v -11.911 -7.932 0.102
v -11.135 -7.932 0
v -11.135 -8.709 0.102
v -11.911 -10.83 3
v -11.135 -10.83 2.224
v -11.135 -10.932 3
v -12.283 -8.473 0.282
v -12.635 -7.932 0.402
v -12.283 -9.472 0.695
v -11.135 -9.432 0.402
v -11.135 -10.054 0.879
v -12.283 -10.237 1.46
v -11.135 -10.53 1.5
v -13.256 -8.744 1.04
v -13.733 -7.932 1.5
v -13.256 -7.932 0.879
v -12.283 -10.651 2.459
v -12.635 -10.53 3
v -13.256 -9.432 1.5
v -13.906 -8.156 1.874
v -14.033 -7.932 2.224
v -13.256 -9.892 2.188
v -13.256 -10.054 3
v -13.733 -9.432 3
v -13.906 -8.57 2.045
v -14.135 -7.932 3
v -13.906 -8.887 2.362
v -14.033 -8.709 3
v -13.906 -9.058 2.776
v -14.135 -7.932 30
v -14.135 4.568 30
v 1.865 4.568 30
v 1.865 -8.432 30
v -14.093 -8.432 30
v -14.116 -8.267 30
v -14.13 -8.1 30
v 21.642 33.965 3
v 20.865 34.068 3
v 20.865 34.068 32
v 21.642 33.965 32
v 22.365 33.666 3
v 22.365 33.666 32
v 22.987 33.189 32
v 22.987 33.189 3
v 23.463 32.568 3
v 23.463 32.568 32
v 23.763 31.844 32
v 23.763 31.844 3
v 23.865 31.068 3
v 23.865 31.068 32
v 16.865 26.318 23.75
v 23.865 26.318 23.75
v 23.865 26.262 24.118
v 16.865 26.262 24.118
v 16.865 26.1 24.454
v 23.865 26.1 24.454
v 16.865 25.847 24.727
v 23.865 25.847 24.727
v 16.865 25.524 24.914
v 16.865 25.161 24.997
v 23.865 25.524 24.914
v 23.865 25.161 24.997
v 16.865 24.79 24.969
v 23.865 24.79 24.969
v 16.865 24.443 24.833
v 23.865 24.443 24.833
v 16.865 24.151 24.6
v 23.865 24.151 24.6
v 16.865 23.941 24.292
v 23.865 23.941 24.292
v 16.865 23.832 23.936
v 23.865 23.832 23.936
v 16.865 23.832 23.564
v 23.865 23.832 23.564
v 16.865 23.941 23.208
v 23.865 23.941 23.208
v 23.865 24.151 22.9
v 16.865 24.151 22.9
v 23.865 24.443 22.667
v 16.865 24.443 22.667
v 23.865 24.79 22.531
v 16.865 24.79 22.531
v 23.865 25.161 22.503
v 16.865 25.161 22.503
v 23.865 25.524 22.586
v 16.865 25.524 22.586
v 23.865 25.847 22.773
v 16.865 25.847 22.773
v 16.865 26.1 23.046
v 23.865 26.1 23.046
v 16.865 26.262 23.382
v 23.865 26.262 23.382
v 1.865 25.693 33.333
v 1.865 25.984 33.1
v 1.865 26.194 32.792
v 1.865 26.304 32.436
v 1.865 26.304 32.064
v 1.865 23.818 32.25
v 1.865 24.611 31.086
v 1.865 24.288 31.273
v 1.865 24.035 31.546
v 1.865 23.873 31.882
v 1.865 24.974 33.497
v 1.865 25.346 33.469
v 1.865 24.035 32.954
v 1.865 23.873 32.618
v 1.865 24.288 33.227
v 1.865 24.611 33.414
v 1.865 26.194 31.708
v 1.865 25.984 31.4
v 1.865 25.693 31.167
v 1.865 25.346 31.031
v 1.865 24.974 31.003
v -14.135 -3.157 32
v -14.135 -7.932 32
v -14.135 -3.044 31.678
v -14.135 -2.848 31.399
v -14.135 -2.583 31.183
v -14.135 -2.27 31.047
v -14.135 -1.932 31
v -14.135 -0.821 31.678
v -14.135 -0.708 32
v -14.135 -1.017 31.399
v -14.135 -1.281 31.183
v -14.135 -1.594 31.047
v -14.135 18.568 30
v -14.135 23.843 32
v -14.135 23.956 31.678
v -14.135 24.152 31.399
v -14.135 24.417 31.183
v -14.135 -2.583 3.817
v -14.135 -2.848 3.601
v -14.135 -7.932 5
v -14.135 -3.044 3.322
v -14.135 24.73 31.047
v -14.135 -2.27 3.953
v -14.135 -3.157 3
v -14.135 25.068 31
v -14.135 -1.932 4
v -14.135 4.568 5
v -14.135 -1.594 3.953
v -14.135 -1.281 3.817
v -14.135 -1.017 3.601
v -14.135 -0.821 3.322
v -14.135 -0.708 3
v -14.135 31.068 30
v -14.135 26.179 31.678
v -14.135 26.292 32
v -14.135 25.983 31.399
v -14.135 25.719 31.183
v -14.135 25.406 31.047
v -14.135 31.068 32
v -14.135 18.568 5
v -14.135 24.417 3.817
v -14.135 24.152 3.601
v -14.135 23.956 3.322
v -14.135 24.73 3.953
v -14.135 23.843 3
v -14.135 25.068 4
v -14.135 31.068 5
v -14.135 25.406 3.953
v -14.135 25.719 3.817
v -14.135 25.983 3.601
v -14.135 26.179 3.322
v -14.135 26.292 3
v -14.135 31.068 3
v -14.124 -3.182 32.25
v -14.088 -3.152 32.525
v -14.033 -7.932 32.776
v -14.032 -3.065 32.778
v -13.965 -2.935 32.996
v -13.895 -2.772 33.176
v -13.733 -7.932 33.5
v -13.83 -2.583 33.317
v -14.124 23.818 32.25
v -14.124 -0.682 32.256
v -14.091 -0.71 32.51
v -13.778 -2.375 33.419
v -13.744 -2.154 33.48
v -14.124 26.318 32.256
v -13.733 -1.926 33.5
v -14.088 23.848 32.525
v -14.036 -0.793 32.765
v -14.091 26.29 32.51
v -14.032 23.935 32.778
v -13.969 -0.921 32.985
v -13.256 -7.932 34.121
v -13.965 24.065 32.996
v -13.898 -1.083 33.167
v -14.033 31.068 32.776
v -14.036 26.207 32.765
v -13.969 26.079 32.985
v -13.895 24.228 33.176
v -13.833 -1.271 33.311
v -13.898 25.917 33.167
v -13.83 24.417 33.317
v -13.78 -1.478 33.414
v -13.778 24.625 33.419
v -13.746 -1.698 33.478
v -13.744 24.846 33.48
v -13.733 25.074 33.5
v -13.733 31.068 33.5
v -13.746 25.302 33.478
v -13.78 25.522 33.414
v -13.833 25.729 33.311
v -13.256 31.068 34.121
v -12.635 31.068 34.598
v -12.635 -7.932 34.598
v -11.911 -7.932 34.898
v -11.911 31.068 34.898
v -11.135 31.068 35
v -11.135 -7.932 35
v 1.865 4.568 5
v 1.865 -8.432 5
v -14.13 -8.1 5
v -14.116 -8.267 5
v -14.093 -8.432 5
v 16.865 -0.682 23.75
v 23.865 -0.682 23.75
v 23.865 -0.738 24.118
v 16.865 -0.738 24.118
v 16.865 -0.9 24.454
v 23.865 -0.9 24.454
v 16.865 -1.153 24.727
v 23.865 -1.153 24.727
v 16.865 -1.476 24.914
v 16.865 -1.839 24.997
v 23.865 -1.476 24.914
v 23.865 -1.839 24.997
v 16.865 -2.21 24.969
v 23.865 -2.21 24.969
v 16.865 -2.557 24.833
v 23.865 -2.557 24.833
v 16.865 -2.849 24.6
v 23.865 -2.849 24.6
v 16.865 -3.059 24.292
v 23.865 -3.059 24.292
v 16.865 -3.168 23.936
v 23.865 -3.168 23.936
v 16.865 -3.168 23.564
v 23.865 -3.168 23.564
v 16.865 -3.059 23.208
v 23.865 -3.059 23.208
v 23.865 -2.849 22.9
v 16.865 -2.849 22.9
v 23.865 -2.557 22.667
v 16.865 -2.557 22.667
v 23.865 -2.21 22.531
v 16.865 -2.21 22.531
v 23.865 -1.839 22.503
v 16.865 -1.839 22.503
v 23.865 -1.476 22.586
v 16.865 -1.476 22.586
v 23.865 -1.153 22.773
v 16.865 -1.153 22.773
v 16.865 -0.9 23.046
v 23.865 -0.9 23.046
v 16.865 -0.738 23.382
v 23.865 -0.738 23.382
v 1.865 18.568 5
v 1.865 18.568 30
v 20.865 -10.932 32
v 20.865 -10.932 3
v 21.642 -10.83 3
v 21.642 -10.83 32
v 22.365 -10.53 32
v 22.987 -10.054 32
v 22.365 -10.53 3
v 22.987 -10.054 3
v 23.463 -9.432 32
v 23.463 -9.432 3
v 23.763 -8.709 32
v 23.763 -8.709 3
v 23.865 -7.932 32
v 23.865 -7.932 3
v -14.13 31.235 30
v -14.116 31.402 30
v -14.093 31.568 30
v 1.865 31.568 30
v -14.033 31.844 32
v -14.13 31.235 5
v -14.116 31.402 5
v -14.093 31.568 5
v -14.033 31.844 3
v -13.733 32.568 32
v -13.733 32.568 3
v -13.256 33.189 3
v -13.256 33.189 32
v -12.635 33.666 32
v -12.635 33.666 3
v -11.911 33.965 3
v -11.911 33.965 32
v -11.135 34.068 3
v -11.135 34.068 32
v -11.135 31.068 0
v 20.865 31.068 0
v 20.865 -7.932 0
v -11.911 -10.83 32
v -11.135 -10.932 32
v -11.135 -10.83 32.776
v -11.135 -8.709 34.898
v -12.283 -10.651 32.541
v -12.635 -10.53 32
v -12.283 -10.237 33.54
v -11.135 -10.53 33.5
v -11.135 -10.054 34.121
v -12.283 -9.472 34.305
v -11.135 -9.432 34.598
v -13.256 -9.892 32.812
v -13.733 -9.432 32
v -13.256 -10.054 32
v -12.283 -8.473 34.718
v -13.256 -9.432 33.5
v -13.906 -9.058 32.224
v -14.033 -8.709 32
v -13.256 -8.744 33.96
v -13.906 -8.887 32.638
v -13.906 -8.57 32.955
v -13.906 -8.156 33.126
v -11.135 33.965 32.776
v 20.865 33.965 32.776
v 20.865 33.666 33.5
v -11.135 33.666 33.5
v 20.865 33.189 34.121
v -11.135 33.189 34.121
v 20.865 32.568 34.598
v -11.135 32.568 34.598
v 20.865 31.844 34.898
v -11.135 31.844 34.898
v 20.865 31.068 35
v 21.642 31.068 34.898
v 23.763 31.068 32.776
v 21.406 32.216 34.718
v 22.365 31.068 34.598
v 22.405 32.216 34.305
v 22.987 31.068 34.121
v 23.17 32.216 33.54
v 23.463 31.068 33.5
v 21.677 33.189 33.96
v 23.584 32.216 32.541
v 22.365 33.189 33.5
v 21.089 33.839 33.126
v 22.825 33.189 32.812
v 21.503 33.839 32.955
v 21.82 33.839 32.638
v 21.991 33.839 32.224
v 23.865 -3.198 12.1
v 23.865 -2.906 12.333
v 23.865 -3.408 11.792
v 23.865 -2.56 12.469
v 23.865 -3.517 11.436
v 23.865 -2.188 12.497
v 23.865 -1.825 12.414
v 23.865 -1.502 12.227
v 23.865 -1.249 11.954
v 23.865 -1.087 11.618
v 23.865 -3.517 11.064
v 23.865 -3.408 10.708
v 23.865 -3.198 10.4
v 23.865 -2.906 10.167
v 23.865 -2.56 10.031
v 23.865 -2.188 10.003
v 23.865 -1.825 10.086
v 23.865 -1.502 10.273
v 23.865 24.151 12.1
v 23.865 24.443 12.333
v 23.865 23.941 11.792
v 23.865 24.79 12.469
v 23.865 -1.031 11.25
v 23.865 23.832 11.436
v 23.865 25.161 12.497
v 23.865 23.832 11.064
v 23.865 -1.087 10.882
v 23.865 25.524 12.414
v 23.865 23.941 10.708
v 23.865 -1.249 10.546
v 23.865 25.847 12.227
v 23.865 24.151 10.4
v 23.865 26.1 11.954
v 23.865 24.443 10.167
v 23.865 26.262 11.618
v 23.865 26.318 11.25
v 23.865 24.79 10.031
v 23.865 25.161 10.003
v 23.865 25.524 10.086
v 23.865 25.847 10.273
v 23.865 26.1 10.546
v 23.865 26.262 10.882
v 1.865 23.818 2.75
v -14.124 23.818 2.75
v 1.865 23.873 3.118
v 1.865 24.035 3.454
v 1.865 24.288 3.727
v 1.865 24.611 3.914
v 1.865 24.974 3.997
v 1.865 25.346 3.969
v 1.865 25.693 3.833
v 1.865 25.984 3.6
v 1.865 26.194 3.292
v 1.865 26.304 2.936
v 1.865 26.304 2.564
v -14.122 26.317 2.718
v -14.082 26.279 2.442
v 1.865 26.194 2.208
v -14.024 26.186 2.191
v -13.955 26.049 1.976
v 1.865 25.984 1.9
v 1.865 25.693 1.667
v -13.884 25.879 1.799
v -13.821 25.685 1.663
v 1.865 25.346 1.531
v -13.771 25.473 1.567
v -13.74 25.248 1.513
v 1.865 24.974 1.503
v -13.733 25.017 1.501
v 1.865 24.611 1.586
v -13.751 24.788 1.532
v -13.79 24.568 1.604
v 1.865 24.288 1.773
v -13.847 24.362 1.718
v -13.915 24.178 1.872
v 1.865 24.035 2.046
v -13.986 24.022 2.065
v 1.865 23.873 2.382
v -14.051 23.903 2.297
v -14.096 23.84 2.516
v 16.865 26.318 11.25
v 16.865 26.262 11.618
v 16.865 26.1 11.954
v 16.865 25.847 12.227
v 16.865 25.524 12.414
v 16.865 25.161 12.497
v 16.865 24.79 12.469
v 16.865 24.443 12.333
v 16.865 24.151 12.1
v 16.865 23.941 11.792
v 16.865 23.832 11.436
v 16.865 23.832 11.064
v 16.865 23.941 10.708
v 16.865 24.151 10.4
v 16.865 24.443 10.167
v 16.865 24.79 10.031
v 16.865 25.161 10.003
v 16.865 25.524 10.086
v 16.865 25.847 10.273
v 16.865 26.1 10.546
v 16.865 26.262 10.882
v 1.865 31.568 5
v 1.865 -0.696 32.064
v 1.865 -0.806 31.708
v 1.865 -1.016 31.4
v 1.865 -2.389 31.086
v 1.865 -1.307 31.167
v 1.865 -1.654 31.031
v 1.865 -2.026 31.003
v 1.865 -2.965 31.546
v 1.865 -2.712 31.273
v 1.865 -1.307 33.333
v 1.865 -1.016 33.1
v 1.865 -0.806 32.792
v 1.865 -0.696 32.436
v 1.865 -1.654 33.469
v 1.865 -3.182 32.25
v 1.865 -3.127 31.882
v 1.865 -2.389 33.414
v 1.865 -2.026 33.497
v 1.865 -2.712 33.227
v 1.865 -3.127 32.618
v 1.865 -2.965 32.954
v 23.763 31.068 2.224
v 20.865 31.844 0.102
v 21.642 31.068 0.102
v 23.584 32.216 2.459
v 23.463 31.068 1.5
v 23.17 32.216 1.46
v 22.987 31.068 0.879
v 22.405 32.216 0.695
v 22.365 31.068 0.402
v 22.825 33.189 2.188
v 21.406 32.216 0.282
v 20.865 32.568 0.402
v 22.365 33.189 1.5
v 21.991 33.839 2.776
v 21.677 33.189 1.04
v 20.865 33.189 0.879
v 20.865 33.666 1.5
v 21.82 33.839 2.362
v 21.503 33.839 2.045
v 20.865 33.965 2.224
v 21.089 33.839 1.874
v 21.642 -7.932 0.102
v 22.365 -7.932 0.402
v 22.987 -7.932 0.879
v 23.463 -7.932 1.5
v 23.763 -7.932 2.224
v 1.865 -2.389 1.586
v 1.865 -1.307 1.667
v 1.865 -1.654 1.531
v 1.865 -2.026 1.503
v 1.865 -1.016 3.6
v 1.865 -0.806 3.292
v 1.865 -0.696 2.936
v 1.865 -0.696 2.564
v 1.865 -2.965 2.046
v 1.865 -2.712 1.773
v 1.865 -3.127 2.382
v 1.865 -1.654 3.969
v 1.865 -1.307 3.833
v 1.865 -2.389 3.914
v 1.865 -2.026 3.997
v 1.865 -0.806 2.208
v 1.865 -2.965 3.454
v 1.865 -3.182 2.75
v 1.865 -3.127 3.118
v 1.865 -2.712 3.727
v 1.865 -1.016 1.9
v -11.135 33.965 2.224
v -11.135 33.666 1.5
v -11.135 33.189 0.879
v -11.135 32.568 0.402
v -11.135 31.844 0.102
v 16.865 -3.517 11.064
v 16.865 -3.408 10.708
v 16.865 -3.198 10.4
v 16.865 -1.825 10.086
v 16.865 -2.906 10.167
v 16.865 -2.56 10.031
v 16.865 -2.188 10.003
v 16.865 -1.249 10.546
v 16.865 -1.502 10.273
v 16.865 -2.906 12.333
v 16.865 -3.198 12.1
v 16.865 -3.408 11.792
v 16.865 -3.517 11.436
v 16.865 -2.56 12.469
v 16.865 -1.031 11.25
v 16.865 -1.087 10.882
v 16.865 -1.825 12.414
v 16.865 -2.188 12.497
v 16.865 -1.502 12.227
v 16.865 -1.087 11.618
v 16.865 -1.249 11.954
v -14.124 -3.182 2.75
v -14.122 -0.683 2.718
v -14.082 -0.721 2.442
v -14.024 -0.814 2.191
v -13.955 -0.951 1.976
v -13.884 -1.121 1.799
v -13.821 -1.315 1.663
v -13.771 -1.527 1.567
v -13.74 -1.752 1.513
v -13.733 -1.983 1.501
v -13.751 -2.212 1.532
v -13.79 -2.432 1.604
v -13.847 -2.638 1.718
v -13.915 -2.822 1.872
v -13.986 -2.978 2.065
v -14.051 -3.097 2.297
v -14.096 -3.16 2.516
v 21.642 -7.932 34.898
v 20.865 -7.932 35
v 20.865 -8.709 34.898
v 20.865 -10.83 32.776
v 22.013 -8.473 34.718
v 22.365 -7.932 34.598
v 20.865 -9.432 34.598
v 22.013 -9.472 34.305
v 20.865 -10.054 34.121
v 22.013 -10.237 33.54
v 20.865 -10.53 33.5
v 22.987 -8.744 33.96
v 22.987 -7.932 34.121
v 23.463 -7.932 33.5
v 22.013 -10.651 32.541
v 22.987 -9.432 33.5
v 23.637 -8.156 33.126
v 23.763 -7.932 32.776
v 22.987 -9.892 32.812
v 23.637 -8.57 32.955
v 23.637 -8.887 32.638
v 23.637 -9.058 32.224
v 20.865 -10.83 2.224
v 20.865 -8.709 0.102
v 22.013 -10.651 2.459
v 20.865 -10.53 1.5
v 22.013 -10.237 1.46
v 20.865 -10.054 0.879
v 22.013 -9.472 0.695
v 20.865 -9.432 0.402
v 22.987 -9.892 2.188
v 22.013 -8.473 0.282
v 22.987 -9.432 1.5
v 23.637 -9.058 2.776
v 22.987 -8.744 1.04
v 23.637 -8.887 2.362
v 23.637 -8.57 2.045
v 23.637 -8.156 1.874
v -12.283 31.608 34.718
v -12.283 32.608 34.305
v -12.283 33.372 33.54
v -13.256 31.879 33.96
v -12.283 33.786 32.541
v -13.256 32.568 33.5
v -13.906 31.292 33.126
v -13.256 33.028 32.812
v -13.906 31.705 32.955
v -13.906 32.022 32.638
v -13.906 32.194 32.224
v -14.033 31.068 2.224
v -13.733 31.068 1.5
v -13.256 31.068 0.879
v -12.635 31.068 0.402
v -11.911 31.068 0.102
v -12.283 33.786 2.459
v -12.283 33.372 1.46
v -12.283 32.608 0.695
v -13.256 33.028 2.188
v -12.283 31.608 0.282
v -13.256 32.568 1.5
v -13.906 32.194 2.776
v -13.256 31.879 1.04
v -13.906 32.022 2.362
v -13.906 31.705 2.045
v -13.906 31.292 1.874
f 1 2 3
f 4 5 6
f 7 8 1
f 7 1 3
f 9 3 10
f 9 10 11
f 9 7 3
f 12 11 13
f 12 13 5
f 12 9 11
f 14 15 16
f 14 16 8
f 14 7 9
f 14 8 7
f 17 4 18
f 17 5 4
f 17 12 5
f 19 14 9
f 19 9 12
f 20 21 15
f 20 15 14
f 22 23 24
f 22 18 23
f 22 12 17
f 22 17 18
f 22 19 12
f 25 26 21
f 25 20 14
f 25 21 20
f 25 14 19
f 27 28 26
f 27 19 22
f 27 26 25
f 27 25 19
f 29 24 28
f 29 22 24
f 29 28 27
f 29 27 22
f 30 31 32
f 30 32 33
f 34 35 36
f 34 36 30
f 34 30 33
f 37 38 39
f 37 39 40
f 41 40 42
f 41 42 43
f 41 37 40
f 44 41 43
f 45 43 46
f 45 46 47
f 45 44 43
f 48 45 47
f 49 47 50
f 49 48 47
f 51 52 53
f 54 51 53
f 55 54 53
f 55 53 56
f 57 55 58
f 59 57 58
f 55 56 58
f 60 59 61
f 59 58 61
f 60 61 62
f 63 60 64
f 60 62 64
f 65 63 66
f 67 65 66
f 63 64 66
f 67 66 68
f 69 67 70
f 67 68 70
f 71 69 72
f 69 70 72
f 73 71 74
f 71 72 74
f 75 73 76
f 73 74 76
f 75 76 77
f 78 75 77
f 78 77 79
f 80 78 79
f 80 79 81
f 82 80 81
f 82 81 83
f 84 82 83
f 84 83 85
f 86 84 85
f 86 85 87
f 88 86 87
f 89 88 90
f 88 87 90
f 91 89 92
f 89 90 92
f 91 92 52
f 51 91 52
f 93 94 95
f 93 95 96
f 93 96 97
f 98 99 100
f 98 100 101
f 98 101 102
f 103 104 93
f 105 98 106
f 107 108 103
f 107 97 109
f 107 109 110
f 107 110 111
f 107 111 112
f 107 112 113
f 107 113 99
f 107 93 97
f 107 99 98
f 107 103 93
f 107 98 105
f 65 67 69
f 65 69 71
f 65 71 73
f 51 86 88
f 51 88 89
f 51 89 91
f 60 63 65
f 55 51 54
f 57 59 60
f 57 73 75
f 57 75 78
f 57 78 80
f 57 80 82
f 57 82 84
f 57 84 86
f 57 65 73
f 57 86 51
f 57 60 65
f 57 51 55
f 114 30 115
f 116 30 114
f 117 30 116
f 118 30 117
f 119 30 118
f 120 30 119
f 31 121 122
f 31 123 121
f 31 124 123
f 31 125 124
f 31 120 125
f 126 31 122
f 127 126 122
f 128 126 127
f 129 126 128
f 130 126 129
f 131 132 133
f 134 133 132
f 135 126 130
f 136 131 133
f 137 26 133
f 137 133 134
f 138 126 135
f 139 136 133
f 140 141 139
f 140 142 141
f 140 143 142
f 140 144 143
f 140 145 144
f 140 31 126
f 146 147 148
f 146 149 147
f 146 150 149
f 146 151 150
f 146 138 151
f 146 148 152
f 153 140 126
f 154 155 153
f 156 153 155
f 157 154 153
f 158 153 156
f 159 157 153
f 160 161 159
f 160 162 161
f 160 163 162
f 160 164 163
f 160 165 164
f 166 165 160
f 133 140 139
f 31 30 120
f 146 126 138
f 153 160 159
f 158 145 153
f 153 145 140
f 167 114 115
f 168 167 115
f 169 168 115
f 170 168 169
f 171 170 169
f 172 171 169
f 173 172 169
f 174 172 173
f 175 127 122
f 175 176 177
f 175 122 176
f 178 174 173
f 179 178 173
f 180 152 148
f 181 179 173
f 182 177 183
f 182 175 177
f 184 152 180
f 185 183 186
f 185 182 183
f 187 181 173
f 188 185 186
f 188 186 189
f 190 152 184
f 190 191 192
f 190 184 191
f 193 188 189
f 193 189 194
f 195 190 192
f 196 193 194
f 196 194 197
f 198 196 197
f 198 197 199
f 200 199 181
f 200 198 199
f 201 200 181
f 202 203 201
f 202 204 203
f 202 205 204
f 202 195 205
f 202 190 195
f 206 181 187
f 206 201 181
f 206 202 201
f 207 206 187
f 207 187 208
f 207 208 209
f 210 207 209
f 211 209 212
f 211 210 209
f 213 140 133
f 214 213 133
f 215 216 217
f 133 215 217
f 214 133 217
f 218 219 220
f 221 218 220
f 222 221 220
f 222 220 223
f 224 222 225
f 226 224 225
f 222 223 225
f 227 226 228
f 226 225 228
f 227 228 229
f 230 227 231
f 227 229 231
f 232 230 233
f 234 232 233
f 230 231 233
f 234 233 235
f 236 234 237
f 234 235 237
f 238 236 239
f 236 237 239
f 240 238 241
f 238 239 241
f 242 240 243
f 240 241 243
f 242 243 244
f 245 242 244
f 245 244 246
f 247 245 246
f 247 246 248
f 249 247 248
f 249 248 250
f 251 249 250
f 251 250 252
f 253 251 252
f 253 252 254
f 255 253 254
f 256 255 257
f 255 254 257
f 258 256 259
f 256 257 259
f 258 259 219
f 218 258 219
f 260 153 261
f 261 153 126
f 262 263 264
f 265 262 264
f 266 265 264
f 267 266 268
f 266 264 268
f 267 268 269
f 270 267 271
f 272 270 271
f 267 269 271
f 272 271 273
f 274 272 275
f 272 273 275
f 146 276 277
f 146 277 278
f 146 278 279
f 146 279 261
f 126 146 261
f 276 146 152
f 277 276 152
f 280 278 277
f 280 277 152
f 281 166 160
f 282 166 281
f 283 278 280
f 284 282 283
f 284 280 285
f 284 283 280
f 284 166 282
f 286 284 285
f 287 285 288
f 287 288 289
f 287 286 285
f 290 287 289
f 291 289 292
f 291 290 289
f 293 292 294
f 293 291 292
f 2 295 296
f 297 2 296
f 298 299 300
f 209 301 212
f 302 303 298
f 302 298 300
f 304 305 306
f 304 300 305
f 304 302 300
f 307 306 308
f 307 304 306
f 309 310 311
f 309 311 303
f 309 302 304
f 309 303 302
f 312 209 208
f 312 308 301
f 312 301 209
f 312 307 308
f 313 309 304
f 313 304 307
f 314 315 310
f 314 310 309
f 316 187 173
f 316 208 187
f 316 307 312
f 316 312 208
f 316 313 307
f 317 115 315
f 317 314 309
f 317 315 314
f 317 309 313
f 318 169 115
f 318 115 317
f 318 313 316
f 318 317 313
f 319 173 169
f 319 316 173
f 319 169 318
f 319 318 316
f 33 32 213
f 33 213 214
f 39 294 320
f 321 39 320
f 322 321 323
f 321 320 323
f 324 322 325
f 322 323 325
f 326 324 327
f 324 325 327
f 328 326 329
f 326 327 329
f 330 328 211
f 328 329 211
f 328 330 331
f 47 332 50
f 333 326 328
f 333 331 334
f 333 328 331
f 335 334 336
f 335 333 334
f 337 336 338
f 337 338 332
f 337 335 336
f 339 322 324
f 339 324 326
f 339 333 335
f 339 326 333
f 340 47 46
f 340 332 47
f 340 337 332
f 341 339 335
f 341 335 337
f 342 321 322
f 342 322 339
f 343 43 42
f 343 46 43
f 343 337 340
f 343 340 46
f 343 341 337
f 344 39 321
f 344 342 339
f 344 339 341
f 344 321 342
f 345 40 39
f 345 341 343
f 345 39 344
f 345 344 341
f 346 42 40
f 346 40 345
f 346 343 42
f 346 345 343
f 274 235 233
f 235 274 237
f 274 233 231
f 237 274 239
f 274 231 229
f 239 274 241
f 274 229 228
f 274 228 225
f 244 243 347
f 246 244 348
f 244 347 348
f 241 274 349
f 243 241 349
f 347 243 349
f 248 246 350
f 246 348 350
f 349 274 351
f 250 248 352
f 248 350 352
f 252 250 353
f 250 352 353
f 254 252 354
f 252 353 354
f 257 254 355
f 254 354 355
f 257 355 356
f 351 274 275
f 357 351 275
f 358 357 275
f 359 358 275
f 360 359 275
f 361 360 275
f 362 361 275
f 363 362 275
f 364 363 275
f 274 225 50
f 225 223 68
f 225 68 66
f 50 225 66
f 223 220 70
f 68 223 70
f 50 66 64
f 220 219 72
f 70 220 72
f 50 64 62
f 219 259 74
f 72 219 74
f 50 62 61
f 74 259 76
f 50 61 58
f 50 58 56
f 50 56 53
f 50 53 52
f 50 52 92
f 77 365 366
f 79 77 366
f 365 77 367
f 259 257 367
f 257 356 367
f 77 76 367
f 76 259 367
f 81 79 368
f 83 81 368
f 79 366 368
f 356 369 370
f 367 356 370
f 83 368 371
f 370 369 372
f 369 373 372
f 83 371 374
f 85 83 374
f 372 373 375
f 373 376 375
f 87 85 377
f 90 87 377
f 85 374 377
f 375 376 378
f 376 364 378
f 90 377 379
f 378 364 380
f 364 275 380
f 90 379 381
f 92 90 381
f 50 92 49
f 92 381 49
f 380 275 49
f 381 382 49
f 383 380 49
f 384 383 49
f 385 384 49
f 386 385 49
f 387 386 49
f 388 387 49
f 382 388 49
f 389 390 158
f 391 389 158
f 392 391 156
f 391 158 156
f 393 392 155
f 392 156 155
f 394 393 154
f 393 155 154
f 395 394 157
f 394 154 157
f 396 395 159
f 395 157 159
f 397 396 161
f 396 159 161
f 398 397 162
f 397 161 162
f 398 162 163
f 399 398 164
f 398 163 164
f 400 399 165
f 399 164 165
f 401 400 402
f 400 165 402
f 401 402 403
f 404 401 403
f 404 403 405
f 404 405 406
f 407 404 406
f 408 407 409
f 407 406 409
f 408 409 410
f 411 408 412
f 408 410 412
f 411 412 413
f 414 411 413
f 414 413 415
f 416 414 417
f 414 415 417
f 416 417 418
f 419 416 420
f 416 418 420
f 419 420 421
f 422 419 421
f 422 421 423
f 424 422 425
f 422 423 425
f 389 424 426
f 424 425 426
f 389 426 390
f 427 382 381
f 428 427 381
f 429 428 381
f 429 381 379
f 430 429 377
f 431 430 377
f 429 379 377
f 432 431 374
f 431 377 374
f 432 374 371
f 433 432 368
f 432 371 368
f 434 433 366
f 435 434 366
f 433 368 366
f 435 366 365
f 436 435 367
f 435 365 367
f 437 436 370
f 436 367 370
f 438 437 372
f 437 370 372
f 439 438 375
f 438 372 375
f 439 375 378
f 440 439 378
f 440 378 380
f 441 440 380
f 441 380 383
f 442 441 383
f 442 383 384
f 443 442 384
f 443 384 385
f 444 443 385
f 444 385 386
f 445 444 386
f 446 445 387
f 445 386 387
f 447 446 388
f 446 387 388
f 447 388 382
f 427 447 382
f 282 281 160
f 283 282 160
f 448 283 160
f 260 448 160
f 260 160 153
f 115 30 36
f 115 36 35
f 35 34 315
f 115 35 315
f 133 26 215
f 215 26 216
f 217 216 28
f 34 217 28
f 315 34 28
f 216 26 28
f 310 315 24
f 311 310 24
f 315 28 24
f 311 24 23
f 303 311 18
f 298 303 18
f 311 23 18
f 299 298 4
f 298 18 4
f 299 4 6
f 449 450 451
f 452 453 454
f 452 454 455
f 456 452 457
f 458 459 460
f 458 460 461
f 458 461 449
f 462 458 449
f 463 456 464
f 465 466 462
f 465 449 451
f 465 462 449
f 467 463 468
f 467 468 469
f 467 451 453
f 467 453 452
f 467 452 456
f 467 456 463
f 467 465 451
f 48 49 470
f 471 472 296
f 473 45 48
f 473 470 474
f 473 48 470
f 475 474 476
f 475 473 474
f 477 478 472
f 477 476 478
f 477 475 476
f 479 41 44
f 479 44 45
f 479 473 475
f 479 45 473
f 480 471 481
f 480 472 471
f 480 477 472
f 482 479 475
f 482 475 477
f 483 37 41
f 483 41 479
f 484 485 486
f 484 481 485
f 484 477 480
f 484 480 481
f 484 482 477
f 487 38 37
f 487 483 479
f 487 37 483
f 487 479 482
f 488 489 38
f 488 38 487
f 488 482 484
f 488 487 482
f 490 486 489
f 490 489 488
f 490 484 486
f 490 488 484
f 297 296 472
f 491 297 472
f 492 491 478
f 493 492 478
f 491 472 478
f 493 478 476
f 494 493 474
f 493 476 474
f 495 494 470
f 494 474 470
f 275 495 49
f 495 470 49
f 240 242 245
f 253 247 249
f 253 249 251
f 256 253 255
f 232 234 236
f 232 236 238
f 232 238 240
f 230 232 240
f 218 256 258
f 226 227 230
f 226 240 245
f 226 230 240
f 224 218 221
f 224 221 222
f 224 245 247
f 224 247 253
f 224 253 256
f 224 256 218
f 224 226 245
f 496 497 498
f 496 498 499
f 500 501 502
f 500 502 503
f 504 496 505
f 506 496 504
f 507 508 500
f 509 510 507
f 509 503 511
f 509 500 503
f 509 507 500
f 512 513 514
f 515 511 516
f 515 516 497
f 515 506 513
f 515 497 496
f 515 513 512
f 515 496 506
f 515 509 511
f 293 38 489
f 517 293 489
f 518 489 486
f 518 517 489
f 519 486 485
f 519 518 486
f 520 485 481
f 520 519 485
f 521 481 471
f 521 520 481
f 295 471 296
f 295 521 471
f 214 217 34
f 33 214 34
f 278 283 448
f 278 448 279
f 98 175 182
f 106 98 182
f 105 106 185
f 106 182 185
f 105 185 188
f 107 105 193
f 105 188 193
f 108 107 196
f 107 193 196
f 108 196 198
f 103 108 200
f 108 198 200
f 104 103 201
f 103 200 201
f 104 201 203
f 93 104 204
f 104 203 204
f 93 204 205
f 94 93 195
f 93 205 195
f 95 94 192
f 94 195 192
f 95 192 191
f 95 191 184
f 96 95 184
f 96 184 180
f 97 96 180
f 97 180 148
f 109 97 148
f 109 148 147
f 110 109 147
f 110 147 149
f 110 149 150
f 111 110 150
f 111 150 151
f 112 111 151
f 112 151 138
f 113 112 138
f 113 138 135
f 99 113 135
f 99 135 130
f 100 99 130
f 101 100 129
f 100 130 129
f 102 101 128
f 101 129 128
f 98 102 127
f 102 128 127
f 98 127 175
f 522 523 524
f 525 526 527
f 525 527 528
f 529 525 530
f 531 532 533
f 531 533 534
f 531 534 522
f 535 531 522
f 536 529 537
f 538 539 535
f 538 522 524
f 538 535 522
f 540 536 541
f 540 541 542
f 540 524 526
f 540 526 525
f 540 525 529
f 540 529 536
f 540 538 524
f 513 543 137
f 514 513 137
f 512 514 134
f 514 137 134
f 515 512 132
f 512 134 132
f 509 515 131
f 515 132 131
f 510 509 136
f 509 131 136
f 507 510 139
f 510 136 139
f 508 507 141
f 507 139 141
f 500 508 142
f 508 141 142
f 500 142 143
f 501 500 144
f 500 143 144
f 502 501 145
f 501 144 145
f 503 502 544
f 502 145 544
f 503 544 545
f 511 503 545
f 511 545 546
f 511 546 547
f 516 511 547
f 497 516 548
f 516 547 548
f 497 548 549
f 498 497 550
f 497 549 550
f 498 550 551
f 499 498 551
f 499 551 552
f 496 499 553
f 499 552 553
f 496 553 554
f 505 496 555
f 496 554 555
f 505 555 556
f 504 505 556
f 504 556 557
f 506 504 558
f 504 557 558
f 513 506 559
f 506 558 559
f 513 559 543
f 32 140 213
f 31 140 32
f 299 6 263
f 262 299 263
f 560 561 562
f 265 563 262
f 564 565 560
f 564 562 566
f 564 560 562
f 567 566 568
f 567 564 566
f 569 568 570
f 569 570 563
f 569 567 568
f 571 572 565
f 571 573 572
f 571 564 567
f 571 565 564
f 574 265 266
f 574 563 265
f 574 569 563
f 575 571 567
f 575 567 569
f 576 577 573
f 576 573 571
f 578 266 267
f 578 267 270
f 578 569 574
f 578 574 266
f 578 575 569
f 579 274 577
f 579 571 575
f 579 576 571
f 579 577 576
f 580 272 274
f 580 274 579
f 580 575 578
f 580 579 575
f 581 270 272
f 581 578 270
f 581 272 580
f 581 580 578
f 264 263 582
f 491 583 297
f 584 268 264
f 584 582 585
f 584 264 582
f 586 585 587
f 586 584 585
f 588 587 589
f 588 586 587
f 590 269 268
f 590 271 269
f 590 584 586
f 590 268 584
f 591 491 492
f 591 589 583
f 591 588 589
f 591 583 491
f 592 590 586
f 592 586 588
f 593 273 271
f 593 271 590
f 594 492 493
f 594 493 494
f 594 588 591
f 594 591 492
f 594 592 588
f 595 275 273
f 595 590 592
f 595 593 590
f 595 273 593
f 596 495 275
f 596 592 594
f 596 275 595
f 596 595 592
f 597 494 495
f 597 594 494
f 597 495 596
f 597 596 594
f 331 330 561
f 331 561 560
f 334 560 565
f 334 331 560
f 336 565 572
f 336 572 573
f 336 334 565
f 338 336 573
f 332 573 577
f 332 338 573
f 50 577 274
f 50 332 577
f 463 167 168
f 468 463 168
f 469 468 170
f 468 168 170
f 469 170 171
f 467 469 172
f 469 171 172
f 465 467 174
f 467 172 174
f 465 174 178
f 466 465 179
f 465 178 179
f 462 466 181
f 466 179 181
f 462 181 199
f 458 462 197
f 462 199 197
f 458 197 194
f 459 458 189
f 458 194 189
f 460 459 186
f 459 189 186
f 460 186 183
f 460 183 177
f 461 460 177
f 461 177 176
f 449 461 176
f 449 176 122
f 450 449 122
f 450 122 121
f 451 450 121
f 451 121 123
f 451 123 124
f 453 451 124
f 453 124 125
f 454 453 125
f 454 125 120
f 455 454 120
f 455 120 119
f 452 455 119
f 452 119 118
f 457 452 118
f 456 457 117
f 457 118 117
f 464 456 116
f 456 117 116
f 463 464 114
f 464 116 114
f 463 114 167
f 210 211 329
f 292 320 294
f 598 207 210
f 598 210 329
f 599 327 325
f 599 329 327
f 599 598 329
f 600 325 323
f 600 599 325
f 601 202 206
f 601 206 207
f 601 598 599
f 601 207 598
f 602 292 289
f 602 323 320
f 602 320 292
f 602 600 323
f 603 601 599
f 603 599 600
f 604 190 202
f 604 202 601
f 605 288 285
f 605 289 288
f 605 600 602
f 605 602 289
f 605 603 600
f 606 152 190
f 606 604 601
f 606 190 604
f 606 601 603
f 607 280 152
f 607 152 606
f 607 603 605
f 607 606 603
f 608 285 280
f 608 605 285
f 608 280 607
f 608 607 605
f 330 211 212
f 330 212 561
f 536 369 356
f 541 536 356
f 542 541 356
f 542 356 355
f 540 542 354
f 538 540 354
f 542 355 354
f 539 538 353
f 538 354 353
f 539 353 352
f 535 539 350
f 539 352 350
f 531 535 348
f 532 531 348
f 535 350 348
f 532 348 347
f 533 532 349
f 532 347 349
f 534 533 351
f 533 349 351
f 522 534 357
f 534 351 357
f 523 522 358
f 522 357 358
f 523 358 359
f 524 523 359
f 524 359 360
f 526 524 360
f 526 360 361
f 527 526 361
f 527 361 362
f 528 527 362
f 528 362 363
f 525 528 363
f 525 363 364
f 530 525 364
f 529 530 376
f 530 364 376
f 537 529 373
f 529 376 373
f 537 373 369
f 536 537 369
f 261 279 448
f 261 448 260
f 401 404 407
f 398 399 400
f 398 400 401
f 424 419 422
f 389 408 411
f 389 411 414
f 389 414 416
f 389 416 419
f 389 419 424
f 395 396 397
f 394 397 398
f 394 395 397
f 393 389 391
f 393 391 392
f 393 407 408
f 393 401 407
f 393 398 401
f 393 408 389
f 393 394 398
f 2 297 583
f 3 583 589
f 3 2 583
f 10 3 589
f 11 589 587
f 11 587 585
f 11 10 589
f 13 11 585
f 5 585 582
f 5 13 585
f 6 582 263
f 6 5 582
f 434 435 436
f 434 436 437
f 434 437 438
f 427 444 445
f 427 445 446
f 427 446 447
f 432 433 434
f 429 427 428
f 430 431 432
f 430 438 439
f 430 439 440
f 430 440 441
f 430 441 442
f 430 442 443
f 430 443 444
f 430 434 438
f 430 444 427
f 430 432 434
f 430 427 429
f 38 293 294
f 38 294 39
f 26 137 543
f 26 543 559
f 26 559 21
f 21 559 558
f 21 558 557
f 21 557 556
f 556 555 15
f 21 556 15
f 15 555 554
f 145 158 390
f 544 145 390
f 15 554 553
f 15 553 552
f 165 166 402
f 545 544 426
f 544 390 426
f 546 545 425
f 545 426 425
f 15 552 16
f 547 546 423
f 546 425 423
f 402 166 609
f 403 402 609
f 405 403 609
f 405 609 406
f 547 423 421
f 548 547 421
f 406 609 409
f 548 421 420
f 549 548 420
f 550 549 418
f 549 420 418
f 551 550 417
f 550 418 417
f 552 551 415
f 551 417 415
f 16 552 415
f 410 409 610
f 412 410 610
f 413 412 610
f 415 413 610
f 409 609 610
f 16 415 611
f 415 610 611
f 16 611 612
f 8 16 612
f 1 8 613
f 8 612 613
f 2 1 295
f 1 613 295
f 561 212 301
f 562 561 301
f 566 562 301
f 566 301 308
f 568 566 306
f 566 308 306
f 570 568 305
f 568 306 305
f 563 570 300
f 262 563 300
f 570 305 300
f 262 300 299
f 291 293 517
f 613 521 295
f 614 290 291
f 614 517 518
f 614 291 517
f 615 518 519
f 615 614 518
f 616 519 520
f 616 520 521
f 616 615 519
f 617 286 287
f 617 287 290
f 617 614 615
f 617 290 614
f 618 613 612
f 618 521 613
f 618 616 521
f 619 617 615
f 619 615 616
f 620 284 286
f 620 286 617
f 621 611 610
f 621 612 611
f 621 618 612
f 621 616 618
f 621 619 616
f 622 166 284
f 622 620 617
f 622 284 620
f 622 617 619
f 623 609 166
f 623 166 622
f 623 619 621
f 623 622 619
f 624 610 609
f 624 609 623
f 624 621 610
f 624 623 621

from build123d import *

# Parameters (mm, degrees)
F0_W         = 38
F0_H         = 45
F1_DEPTH     = 35
F2_W         = 13
F2_H         = 25
F2_R         = 1.25
F3_DEPTH     = 16
F4_T1_DEPTH  = 32
F4_T3_DEPTH  = 39
F4_T5_DEPTH  = 29
F4_S9_W      = 3
F4_S9_H      = 3
F4_T10_DEPTH = 3
F4_S15_W     = 3
F4_S15_H     = 3
F4_T16_DEPTH = 3
F4_S21_W     = 3
F4_S21_H     = 3
F4_T22_DEPTH = 3
F4_S27_W     = 3
F4_S27_H     = 3
F4_T28_DEPTH = 3
F4_S33_W     = 3
F4_S33_H     = 3
F4_T34_DEPTH = 3
F4_S39_W     = 3
F4_S39_H     = 3
F4_T40_DEPTH = 3
F4_S45_W     = 3
F4_S45_H     = 3
F4_T46_DEPTH = 3
F4_S51_W     = 3
F4_S51_H     = 3
F4_T52_DEPTH = 3
F5_R         = 1.25
F6_DEPTH     = 7


# Not quite as in the source:
# - a fillet or chamfer that OpenCascade refuses, or shapes differently, is made with other operations: its cross-section is extruded or revolved along the edge and cut away or added


with BuildPart() as f1:
    # F0 (on Top) → F1 (new body)
    with BuildSketch(Plane.XY):
        with Locations((4.8651863657, 11.567664966)):
            Rectangle(F0_W, F0_H)
    extrude(amount=F1_DEPTH)

    # F2 (on face) → F3 (cut)
    with BuildSketch(Plane(origin=(-14.1348136343, 0, 0), x_dir=(0, -1, 0), z_dir=(-1, 0, 0))):
        with Locations((-25.067664966, 17.5)):
            Rectangle(F2_W, F2_H)
        with Locations((1.932335034, 17.5)):
            Rectangle(F2_W, F2_H)
        with Locations((1.932335034, 32.25)):
            Circle(F2_R)
        with Locations((1.932335034, 2.75)):
            Circle(F2_R)
        with Locations((-25.067664966, 32.25)):
            Circle(F2_R)
        with Locations((-25.067664966, 2.75)):
            Circle(F2_R)
    extrude(amount=-F3_DEPTH, mode=Mode.SUBTRACT)

    # F4: fillet of radius 3 on 12 edges, made by hand

    # F4_s2 → F4_t1 (cut)
    with BuildSketch(Plane.YZ.offset(-11.1348136343)):
        with BuildLine():
            ThreePointArc((34.067664966, 3), (33.1889853095, 0.8786796564), (31.067664966, 0))
            Line((31.067664966, 0), (34.067664966, 0))
            Line((34.067664966, 0), (34.067664966, 3))
        make_face()
        with BuildLine():
            ThreePointArc((34.067664966, 32), (33.1889853095, 34.1213203436), (31.067664966, 35))
            Line((31.067664966, 35), (34.067664966, 35))
            Line((34.067664966, 35), (34.067664966, 32))
        make_face()
        with BuildLine():
            ThreePointArc((-7.932335034, 0), (-10.0536553776, 0.8786796564), (-10.932335034, 3))
            Line((-10.932335034, 3), (-10.932335034, 0))
            Line((-10.932335034, 0), (-7.932335034, 0))
        make_face()
        with BuildLine():
            ThreePointArc((-7.932335034, 35), (-10.0536553776, 34.1213203436), (-10.932335034, 32))
            Line((-10.932335034, 32), (-10.932335034, 35))
            Line((-10.932335034, 35), (-7.932335034, 35))
        make_face()
    extrude(amount=F4_T1_DEPTH, mode=Mode.SUBTRACT)

    # F4_s4 → F4_t3 (cut)
    with BuildSketch(Plane.XZ.offset(-31.067664966)):
        with BuildLine():
            ThreePointArc((20.8651863657, 35), (22.9865067092, 34.1213203436), (23.8651863657, 32))
            Line((23.8651863657, 32), (23.8651863657, 35))
            Line((23.8651863657, 35), (20.8651863657, 35))
        make_face()
        with BuildLine():
            ThreePointArc((20.8651863657, 0), (22.9865067092, 0.8786796564), (23.8651863657, 3))
            Line((23.8651863657, 3), (23.8651863657, 0))
            Line((23.8651863657, 0), (20.8651863657, 0))
        make_face()
        with BuildLine():
            ThreePointArc((-14.1348136343, 32), (-13.2561339779, 34.1213203436), (-11.1348136343, 35))
            Line((-11.1348136343, 35), (-14.1348136343, 35))
            Line((-14.1348136343, 35), (-14.1348136343, 32))
        make_face()
        with BuildLine():
            ThreePointArc((-14.1348136343, 3), (-13.2561339779, 0.8786796564), (-11.1348136343, 0))
            Line((-11.1348136343, 0), (-14.1348136343, 0))
            Line((-14.1348136343, 0), (-14.1348136343, 3))
        make_face()
    extrude(amount=F4_T3_DEPTH, mode=Mode.SUBTRACT)

    # F4_s6 → F4_t5 (cut)
    with BuildSketch(Plane.XY.offset(3)):
        with BuildLine():
            ThreePointArc((20.8651863657, 34.067664966), (22.9865067092, 33.1889853095), (23.8651863657, 31.067664966))
            Line((23.8651863657, 31.067664966), (23.8651863657, 34.067664966))
            Line((23.8651863657, 34.067664966), (20.8651863657, 34.067664966))
        make_face()
        with BuildLine():
            ThreePointArc((20.8651863657, -10.932335034), (22.9865067092, -10.0536553776), (23.8651863657, -7.932335034))
            Line((23.8651863657, -7.932335034), (23.8651863657, -10.932335034))
            Line((23.8651863657, -10.932335034), (20.8651863657, -10.932335034))
        make_face()
        with BuildLine():
            ThreePointArc((-14.1348136343, 31.067664966), (-13.2561339779, 33.1889853095), (-11.1348136343, 34.067664966))
            Line((-11.1348136343, 34.067664966), (-14.1348136343, 34.067664966))
            Line((-14.1348136343, 34.067664966), (-14.1348136343, 31.067664966))
        make_face()
        with BuildLine():
            ThreePointArc((-14.1348136343, -7.932335034), (-13.2561339779, -10.0536553776), (-11.1348136343, -10.932335034))
            Line((-11.1348136343, -10.932335034), (-14.1348136343, -10.932335034))
            Line((-14.1348136343, -10.932335034), (-14.1348136343, -7.932335034))
        make_face()
    extrude(amount=F4_T5_DEPTH, mode=Mode.SUBTRACT)


with BuildPart() as f4_tool8:
    # F4_s9 → F4_t10 (new body)
    with BuildSketch(Plane.XZ.offset(-31.067664966)):
        with Locations((22.3651863657, 1.5)):
            Rectangle(F4_S9_W, F4_S9_H)
    extrude(amount=-F4_T10_DEPTH)

    # F4_s11 → F4_t12 (revolve, cut)
    with BuildSketch(Plane(origin=(20.8651863657, 31.067664966, 3), x_dir=(-0.7071067812, 0, 0.7071067812), z_dir=(-0.7071067812, 0, -0.7071067812))):
        with BuildLine():
            ThreePointArc((0, -3), (3, 0), (0, 3))
            Line((0, 3), (0, -3))
        make_face()
    revolve(axis=Axis((20.8651863657, 31.067664966, 3), (0, 1, 0)), mode=Mode.SUBTRACT)


with BuildPart() as f1_1:
    add(f1.part)

    # F4_t7: cut F4_tool8
    add(f4_tool8.part, mode=Mode.SUBTRACT)


with BuildPart() as f4_tool14:
    # F4_s15 → F4_t16 (new body)
    with BuildSketch(Plane.YZ.offset(-11.1348136343)):
        with Locations((32.567664966, 1.5)):
            Rectangle(F4_S15_W, F4_S15_H)
    extrude(amount=-F4_T16_DEPTH)

    # F4_s17 → F4_t18 (revolve, cut)
    with BuildSketch(Plane(origin=(-11.1348136343, 31.067664966, 3), x_dir=(0, -0.7071067812, 0.7071067812), z_dir=(0, -0.7071067812, -0.7071067812))):
        with BuildLine():
            ThreePointArc((0, -3), (3, 0), (0, 3))
            Line((0, 3), (0, -3))
        make_face()
    revolve(axis=Axis((-11.1348136343, 31.067664966, 3), (-1, 0, 0)), mode=Mode.SUBTRACT)


with BuildPart() as f1_2:
    add(f1_1.part)

    # F4_t13: cut F4_tool14
    add(f4_tool14.part, mode=Mode.SUBTRACT)


with BuildPart() as f4_tool20:
    # F4_s21 → F4_t22 (new body)
    with BuildSketch(Plane.XZ.offset(-31.067664966)):
        with Locations((22.3651863657, 33.5)):
            Rectangle(F4_S21_W, F4_S21_H)
    extrude(amount=-F4_T22_DEPTH)

    # F4_s23 → F4_t24 (revolve, cut)
    with BuildSketch(Plane(origin=(20.8651863657, 31.067664966, 32), x_dir=(-0.7071067812, 0, -0.7071067812), z_dir=(0.7071067812, 0, -0.7071067812))):
        with BuildLine():
            ThreePointArc((0, -3), (3, 0), (0, 3))
            Line((0, 3), (0, -3))
        make_face()
    revolve(axis=Axis((20.8651863657, 31.067664966, 32), (0, 1, 0)), mode=Mode.SUBTRACT)


with BuildPart() as f1_3:
    add(f1_2.part)

    # F4_t19: cut F4_tool20
    add(f4_tool20.part, mode=Mode.SUBTRACT)


with BuildPart() as f4_tool26:
    # F4_s27 → F4_t28 (new body)
    with BuildSketch(Plane.YZ.offset(-11.1348136343)):
        with Locations((32.567664966, 33.5)):
            Rectangle(F4_S27_W, F4_S27_H)
    extrude(amount=-F4_T28_DEPTH)

    # F4_s29 → F4_t30 (revolve, cut)
    with BuildSketch(Plane(origin=(-11.1348136343, 31.067664966, 32), x_dir=(0, -0.7071067812, -0.7071067812), z_dir=(0, 0.7071067812, -0.7071067812))):
        with BuildLine():
            ThreePointArc((0, -3), (3, 0), (0, 3))
            Line((0, 3), (0, -3))
        make_face()
    revolve(axis=Axis((-11.1348136343, 31.067664966, 32), (-1, 0, 0)), mode=Mode.SUBTRACT)


with BuildPart() as f1_4:
    add(f1_3.part)

    # F4_t25: cut F4_tool26
    add(f4_tool26.part, mode=Mode.SUBTRACT)


with BuildPart() as f4_tool32:
    # F4_s33 → F4_t34 (new body)
    with BuildSketch(Plane.YZ.offset(-11.1348136343)):
        with Locations((-9.432335034, 1.5)):
            Rectangle(F4_S33_W, F4_S33_H)
    extrude(amount=-F4_T34_DEPTH)

    # F4_s35 → F4_t36 (revolve, cut)
    with BuildSketch(Plane(origin=(-11.1348136343, -7.932335034, 3), x_dir=(0, 0.7071067812, 0.7071067812), z_dir=(0, -0.7071067812, 0.7071067812))):
        with BuildLine():
            ThreePointArc((0, -3), (3, 0), (0, 3))
            Line((0, 3), (0, -3))
        make_face()
    revolve(axis=Axis((-11.1348136343, -7.932335034, 3), (-1, 0, 0)), mode=Mode.SUBTRACT)


with BuildPart() as f1_5:
    add(f1_4.part)

    # F4_t31: cut F4_tool32
    add(f4_tool32.part, mode=Mode.SUBTRACT)


with BuildPart() as f4_tool38:
    # F4_s39 → F4_t40 (new body)
    with BuildSketch(Plane.YZ.offset(20.8651863657)):
        with Locations((-9.432335034, 1.5)):
            Rectangle(F4_S39_W, F4_S39_H)
    extrude(amount=F4_T40_DEPTH)

    # F4_s41 → F4_t42 (revolve, cut)
    with BuildSketch(Plane(origin=(20.8651863657, -7.932335034, 3), x_dir=(0, 0.7071067812, 0.7071067812), z_dir=(0, 0.7071067812, -0.7071067812))):
        with BuildLine():
            ThreePointArc((0, -3), (3, 0), (0, 3))
            Line((0, 3), (0, -3))
        make_face()
    revolve(axis=Axis((20.8651863657, -7.932335034, 3), (1, 0, 0)), mode=Mode.SUBTRACT)


with BuildPart() as f1_6:
    add(f1_5.part)

    # F4_t37: cut F4_tool38
    add(f4_tool38.part, mode=Mode.SUBTRACT)


with BuildPart() as f4_tool44:
    # F4_s45 → F4_t46 (new body)
    with BuildSketch(Plane.YZ.offset(-11.1348136343)):
        with Locations((-9.432335034, 33.5)):
            Rectangle(F4_S45_W, F4_S45_H)
    extrude(amount=-F4_T46_DEPTH)

    # F4_s47 → F4_t48 (revolve, cut)
    with BuildSketch(Plane(origin=(-11.1348136343, -7.932335034, 32), x_dir=(0, 0.7071067812, -0.7071067812), z_dir=(0, 0.7071067812, 0.7071067812))):
        with BuildLine():
            ThreePointArc((0, -3), (3, 0), (0, 3))
            Line((0, 3), (0, -3))
        make_face()
    revolve(axis=Axis((-11.1348136343, -7.932335034, 32), (-1, 0, 0)), mode=Mode.SUBTRACT)


with BuildPart() as f1_7:
    add(f1_6.part)

    # F4_t43: cut F4_tool44
    add(f4_tool44.part, mode=Mode.SUBTRACT)


with BuildPart() as f4_tool50:
    # F4_s51 → F4_t52 (new body)
    with BuildSketch(Plane.YZ.offset(20.8651863657)):
        with Locations((-9.432335034, 33.5)):
            Rectangle(F4_S51_W, F4_S51_H)
    extrude(amount=F4_T52_DEPTH)

    # F4_s53 → F4_t54 (revolve, cut)
    with BuildSketch(Plane(origin=(20.8651863657, -7.932335034, 32), x_dir=(0, 0.7071067812, -0.7071067812), z_dir=(0, -0.7071067812, -0.7071067812))):
        with BuildLine():
            ThreePointArc((0, -3), (3, 0), (0, 3))
            Line((0, 3), (0, -3))
        make_face()
    revolve(axis=Axis((20.8651863657, -7.932335034, 32), (1, 0, 0)), mode=Mode.SUBTRACT)


with BuildPart() as f1_8:
    add(f1_7.part)

    # F4_t49: cut F4_tool50
    add(f4_tool50.part, mode=Mode.SUBTRACT)

    # F5 (on face) → F6 (cut)
    with BuildSketch(Plane.YZ.offset(23.8651863657)):
        with Locations((-1.932335034, 23.75)):
            Circle(F5_R)
        with Locations((-2.2813694086, 11.25)):
            Circle(F5_R)
        with Locations((25.067664966, 23.75)):
            Circle(F5_R)
        with Locations((25.067664966, 11.25)):
            Circle(F5_R)
    extrude(amount=-F6_DEPTH, mode=Mode.SUBTRACT)


solid = f1_8.part
